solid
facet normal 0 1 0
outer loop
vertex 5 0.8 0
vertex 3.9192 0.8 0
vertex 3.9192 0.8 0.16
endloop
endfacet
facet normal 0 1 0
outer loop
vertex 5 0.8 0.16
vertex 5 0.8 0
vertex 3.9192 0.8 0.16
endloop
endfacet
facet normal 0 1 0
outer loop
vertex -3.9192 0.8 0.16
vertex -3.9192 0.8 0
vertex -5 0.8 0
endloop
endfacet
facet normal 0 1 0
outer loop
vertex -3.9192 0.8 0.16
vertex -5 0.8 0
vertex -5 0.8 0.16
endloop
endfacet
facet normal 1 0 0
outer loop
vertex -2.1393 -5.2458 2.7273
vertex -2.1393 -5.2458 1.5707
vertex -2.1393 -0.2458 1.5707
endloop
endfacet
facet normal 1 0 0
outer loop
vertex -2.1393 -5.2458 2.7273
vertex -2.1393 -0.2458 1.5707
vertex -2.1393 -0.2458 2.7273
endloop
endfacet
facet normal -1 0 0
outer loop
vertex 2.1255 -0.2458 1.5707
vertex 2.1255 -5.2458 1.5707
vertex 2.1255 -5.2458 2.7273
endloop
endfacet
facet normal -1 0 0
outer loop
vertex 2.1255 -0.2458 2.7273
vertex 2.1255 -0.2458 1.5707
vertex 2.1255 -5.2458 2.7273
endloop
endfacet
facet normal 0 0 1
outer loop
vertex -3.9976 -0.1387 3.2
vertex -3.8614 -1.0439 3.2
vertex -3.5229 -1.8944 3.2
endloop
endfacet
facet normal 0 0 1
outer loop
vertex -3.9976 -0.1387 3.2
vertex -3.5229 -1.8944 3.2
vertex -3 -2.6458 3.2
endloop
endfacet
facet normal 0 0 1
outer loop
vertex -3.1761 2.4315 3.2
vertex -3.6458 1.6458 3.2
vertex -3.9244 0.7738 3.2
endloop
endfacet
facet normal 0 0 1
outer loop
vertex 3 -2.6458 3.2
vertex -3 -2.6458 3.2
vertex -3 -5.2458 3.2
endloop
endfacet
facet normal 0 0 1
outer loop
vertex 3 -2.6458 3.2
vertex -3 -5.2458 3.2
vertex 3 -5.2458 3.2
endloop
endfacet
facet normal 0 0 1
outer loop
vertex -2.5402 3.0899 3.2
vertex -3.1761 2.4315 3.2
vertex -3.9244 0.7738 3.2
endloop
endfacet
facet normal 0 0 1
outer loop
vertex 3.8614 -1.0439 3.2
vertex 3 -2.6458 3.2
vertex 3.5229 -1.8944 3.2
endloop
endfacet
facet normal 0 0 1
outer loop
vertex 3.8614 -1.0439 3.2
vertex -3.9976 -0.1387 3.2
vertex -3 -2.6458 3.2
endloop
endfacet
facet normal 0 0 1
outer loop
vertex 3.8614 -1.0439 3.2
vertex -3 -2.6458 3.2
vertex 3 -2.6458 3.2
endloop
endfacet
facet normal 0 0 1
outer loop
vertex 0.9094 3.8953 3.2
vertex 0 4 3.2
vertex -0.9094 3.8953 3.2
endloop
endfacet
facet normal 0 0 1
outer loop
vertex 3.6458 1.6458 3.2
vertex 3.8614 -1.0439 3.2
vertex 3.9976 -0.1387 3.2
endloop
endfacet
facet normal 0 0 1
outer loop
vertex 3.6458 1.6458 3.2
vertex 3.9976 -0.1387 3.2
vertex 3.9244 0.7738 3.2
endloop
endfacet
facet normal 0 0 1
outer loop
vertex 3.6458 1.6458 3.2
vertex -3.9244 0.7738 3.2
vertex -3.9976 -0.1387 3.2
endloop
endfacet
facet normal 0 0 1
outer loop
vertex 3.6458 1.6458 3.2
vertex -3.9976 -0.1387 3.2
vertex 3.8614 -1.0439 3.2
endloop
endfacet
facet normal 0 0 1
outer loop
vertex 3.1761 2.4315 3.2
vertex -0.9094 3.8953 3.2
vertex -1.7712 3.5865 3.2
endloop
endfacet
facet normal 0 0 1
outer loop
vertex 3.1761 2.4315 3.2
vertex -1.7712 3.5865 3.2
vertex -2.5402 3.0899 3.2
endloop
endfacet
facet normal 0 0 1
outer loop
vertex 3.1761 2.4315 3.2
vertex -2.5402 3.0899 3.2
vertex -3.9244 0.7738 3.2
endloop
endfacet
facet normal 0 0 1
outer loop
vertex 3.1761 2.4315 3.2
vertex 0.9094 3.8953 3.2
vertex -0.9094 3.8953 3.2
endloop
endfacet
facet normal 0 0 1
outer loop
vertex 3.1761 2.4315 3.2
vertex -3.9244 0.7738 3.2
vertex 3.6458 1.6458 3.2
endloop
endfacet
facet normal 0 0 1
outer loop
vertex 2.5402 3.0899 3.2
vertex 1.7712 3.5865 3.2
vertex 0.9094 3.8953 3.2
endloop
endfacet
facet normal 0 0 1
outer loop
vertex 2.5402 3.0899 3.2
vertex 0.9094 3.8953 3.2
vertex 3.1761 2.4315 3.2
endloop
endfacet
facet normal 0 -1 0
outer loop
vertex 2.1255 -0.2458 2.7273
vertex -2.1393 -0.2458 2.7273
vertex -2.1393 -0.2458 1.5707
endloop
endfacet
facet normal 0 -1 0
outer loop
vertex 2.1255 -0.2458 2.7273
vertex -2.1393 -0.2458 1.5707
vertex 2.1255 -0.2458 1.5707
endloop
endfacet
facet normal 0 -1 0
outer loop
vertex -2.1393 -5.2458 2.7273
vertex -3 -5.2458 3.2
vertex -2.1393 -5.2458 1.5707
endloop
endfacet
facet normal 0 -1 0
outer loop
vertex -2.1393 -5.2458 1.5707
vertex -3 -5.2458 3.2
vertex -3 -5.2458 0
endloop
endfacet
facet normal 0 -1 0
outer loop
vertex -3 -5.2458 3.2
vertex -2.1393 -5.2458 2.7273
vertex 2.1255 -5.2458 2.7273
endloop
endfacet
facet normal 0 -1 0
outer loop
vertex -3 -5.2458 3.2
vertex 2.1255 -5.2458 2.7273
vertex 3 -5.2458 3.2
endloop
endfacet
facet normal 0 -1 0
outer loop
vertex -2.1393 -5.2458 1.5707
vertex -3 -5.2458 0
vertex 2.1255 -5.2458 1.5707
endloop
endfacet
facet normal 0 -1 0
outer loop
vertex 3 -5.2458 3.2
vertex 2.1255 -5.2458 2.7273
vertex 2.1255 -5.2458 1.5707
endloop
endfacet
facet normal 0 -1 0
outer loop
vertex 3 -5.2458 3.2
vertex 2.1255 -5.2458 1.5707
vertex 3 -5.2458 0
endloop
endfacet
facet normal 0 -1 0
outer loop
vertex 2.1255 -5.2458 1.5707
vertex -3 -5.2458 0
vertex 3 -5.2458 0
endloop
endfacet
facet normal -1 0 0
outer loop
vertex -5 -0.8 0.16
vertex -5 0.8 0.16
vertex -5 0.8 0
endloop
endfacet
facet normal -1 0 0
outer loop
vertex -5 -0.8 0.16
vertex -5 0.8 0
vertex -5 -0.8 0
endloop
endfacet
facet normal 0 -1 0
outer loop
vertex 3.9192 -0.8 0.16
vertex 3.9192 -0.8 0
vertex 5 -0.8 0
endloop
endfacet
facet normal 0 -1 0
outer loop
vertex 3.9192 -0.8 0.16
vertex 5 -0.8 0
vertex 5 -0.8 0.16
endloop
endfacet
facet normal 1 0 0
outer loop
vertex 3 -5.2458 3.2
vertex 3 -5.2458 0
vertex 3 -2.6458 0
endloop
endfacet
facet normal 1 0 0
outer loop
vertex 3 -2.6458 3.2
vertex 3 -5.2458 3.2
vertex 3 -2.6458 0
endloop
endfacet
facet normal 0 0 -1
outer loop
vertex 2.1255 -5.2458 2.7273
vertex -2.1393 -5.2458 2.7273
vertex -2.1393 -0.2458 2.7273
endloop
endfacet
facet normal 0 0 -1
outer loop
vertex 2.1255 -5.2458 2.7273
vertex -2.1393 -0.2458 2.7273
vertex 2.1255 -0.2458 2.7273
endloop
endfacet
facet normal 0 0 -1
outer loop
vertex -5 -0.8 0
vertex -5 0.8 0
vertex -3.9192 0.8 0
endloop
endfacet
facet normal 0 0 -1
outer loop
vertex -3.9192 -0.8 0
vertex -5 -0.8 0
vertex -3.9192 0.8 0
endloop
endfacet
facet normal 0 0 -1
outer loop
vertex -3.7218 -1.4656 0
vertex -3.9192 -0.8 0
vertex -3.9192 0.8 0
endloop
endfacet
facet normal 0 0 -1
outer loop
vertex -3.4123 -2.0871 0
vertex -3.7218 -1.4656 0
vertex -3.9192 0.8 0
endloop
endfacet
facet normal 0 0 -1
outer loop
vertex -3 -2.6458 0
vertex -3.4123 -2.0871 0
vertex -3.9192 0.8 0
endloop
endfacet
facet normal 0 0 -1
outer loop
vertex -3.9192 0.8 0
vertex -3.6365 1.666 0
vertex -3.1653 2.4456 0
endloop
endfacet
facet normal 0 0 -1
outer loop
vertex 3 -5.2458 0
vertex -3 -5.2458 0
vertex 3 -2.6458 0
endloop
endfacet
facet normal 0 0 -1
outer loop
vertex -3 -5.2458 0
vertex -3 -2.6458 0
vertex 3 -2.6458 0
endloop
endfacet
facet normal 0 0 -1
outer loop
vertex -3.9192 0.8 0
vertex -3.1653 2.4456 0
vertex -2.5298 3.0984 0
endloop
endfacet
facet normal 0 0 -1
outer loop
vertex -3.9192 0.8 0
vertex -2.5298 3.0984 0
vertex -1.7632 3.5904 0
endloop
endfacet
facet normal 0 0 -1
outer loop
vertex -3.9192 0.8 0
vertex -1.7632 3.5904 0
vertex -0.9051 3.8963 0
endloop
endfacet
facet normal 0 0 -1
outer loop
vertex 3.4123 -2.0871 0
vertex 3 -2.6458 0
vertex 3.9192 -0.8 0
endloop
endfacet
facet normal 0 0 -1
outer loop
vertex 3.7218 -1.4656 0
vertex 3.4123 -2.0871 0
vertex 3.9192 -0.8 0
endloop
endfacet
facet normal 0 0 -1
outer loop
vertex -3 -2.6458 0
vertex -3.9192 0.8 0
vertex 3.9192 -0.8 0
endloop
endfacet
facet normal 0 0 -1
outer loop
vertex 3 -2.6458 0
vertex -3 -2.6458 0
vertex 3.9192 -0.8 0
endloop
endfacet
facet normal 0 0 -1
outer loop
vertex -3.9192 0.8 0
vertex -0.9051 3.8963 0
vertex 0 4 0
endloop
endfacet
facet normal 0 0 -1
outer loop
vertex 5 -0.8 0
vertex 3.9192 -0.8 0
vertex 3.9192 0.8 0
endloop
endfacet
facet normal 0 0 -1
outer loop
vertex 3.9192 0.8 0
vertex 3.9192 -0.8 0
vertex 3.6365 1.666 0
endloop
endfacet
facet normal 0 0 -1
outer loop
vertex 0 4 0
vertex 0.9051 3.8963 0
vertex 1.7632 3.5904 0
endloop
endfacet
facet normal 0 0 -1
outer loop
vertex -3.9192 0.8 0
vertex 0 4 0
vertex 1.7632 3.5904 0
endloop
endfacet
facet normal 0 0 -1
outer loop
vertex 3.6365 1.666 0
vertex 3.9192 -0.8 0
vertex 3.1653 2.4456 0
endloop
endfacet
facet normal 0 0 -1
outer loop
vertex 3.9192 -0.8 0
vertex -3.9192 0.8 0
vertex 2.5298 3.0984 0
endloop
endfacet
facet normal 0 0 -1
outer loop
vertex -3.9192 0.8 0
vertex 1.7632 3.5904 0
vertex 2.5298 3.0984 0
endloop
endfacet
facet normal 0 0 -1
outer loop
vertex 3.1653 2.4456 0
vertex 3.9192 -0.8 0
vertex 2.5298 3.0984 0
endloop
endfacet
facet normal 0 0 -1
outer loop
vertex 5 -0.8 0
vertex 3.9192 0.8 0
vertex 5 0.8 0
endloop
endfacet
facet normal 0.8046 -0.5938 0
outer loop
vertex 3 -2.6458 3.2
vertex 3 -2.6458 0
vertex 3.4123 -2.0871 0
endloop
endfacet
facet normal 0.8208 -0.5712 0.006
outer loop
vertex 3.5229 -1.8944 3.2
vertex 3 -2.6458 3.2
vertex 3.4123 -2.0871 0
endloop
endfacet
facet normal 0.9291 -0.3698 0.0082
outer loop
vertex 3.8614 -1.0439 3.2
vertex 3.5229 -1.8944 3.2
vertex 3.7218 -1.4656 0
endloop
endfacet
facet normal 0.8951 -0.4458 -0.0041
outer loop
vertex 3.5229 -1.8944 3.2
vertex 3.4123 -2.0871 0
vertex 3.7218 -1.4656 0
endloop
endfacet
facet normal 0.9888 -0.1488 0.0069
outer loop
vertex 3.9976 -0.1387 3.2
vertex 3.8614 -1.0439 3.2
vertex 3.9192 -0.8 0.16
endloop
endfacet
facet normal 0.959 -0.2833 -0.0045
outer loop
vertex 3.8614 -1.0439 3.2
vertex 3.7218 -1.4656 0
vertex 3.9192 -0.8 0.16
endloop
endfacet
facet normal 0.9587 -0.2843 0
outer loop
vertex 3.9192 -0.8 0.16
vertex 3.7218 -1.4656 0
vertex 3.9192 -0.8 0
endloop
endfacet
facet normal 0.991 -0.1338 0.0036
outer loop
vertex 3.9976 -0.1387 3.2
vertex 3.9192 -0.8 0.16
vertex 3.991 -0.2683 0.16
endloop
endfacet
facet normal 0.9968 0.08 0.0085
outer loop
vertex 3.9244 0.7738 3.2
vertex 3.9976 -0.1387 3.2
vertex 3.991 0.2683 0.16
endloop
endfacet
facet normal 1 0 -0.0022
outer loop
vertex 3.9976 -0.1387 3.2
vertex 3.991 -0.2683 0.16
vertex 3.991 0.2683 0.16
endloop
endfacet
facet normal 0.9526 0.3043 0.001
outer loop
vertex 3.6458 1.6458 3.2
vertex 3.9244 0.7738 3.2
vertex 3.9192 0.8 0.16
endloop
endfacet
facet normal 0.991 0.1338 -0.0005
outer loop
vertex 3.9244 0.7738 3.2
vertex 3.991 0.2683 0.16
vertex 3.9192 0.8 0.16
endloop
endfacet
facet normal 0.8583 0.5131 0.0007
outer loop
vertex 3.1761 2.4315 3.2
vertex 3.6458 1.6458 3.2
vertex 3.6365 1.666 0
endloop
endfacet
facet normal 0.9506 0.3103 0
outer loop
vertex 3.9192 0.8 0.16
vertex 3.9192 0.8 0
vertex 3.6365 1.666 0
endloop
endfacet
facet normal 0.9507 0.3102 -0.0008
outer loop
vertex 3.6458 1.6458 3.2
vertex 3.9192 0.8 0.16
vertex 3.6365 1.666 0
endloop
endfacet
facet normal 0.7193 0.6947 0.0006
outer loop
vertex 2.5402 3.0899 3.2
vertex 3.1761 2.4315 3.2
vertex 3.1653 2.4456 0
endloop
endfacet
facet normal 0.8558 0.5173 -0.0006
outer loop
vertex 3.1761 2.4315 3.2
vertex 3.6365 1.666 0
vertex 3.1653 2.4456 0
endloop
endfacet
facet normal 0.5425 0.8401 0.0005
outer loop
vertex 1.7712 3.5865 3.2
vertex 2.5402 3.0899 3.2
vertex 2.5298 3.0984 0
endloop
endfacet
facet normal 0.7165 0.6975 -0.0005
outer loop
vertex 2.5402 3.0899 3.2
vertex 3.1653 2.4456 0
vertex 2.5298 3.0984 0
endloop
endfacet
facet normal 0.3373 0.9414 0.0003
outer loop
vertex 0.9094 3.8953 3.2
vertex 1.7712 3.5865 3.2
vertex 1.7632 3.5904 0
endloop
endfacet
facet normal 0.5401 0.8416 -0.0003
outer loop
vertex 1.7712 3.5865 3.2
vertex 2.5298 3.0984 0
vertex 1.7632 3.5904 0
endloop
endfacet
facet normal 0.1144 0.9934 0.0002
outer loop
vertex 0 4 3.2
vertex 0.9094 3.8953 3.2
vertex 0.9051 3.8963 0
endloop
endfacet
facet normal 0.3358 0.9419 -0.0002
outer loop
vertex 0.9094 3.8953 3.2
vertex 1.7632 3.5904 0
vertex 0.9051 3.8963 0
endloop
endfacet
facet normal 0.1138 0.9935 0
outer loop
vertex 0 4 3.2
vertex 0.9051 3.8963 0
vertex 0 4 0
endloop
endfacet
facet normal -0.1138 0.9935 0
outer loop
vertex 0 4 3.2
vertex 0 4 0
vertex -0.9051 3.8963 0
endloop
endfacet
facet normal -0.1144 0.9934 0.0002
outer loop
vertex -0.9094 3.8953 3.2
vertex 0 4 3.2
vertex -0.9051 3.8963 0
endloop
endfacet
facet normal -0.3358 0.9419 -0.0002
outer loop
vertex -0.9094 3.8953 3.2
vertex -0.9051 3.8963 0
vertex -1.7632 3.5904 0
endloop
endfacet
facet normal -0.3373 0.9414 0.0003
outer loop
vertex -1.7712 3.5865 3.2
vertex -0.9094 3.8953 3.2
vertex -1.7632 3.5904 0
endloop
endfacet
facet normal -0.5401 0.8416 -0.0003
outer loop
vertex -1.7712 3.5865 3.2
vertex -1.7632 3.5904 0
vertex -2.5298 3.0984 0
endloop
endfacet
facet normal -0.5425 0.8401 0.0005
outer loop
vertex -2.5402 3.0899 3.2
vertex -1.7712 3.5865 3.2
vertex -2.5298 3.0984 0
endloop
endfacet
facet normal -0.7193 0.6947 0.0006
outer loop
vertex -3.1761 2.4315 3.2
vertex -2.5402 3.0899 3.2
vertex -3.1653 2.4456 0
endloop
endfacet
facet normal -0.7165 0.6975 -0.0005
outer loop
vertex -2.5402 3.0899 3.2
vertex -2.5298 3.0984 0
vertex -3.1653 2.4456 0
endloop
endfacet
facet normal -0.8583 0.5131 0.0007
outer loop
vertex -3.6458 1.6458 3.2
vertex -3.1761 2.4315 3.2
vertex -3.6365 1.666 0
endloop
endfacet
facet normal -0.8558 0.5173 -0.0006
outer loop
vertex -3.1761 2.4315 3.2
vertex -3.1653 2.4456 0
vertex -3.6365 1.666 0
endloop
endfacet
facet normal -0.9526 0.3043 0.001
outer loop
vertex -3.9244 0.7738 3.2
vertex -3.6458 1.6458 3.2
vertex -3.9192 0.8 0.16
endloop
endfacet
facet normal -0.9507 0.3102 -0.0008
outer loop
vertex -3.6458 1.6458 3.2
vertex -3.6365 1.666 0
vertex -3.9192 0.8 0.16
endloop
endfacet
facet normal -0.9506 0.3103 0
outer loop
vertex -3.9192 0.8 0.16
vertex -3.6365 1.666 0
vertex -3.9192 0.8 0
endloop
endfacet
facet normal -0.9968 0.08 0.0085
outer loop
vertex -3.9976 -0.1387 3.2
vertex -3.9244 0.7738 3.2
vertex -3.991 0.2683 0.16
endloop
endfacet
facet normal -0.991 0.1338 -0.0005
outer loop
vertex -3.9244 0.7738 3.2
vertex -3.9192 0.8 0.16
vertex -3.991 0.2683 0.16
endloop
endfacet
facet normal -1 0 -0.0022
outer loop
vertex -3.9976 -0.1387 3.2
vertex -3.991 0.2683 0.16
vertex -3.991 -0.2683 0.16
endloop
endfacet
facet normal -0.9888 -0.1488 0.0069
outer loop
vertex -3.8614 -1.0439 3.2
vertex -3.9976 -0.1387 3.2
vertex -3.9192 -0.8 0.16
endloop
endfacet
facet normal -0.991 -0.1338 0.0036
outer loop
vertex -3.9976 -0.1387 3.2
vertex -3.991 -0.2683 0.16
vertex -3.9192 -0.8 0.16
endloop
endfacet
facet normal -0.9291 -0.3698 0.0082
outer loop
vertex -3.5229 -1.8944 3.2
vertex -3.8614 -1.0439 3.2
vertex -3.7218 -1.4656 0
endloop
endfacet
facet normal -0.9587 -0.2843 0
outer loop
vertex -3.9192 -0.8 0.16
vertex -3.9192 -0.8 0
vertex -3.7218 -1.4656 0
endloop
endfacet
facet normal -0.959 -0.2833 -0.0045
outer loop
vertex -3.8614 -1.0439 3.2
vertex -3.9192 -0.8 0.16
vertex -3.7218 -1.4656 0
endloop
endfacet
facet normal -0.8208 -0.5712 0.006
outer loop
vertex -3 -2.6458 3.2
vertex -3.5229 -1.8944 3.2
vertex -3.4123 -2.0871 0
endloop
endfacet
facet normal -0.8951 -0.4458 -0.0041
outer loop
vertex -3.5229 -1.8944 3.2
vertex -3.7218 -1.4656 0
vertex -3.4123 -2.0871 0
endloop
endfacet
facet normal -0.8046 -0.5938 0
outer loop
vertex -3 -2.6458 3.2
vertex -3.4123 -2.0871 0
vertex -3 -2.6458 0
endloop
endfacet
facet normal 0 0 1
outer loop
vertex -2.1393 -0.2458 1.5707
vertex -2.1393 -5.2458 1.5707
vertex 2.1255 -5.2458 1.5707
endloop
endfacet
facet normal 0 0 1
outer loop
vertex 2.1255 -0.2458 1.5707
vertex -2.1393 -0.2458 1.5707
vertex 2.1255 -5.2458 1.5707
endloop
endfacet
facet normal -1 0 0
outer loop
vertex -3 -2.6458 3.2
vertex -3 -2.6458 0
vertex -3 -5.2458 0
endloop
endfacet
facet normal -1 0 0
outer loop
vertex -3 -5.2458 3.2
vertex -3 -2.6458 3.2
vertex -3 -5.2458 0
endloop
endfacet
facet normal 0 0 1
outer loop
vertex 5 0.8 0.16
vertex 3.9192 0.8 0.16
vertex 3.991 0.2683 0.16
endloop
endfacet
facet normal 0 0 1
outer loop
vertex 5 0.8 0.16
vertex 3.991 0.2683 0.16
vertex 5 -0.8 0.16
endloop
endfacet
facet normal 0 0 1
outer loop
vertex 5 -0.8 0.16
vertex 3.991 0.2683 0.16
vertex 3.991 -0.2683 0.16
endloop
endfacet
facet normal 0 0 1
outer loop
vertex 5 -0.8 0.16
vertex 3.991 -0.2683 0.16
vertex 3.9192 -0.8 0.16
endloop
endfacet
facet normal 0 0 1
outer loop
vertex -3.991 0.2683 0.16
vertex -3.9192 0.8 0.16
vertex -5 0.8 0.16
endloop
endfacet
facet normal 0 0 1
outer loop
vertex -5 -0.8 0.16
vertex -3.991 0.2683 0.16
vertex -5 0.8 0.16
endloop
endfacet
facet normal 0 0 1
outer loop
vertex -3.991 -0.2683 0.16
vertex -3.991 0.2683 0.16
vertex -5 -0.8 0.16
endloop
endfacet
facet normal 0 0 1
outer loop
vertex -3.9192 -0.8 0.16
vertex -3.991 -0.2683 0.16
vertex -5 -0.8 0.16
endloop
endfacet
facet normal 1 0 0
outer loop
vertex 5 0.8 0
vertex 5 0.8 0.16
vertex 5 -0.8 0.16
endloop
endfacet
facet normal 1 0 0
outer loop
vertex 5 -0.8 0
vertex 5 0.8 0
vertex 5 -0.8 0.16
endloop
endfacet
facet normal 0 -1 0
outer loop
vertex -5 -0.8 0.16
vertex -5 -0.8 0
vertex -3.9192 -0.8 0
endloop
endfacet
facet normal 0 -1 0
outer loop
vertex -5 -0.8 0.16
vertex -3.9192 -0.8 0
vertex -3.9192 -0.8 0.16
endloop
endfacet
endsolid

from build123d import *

# Parameters (mm, degrees)
PAD_DEPTH    = 3.2
SKETCH001_W  = 1.6
SKETCH001_H  = 0.16
PAD001_DEPTH = 2
SKETCH002_W  = 4.264834
SKETCH002_H  = 1.156565
POCKET_DEPTH = 5


with BuildPart() as part:
    # Sketch → Pad (new body)
    with BuildSketch(Plane.XY):
        with BuildLine():
            ThreePointArc((3, -2.645751), (0, 4), (-3, -2.645751))
            Line((-3, -2.645751), (-3, -5.245751))
            Line((-3, -5.245751), (3, -5.245751))
            Line((3, -5.245751), (3, -2.645751))
        make_face()
    extrude(amount=PAD_DEPTH)

    # Sketch001 (on Face2 of Pad) → Pad001 (join)
    with BuildSketch(Plane(origin=(-3, 0, 0), x_dir=(0, -1, 0), z_dir=(-1, 0, 0))):
        with Locations((0, 0.08)):
            Rectangle(SKETCH001_W, SKETCH001_H)
    pad001 = extrude(amount=PAD001_DEPTH)

    # Mirrored: Pad001 across YZ
    add(pad001.mirror(Plane.YZ))

    # Sketch002 (on Face12 of Mirrored) → Pocket (cut)
    with BuildSketch(Plane.XZ.offset(5.245751)):
        with Locations((-0.006884, 2.148988)):
            Rectangle(SKETCH002_W, SKETCH002_H)
    extrude(amount=-POCKET_DEPTH, mode=Mode.SUBTRACT)


solid = part.part
